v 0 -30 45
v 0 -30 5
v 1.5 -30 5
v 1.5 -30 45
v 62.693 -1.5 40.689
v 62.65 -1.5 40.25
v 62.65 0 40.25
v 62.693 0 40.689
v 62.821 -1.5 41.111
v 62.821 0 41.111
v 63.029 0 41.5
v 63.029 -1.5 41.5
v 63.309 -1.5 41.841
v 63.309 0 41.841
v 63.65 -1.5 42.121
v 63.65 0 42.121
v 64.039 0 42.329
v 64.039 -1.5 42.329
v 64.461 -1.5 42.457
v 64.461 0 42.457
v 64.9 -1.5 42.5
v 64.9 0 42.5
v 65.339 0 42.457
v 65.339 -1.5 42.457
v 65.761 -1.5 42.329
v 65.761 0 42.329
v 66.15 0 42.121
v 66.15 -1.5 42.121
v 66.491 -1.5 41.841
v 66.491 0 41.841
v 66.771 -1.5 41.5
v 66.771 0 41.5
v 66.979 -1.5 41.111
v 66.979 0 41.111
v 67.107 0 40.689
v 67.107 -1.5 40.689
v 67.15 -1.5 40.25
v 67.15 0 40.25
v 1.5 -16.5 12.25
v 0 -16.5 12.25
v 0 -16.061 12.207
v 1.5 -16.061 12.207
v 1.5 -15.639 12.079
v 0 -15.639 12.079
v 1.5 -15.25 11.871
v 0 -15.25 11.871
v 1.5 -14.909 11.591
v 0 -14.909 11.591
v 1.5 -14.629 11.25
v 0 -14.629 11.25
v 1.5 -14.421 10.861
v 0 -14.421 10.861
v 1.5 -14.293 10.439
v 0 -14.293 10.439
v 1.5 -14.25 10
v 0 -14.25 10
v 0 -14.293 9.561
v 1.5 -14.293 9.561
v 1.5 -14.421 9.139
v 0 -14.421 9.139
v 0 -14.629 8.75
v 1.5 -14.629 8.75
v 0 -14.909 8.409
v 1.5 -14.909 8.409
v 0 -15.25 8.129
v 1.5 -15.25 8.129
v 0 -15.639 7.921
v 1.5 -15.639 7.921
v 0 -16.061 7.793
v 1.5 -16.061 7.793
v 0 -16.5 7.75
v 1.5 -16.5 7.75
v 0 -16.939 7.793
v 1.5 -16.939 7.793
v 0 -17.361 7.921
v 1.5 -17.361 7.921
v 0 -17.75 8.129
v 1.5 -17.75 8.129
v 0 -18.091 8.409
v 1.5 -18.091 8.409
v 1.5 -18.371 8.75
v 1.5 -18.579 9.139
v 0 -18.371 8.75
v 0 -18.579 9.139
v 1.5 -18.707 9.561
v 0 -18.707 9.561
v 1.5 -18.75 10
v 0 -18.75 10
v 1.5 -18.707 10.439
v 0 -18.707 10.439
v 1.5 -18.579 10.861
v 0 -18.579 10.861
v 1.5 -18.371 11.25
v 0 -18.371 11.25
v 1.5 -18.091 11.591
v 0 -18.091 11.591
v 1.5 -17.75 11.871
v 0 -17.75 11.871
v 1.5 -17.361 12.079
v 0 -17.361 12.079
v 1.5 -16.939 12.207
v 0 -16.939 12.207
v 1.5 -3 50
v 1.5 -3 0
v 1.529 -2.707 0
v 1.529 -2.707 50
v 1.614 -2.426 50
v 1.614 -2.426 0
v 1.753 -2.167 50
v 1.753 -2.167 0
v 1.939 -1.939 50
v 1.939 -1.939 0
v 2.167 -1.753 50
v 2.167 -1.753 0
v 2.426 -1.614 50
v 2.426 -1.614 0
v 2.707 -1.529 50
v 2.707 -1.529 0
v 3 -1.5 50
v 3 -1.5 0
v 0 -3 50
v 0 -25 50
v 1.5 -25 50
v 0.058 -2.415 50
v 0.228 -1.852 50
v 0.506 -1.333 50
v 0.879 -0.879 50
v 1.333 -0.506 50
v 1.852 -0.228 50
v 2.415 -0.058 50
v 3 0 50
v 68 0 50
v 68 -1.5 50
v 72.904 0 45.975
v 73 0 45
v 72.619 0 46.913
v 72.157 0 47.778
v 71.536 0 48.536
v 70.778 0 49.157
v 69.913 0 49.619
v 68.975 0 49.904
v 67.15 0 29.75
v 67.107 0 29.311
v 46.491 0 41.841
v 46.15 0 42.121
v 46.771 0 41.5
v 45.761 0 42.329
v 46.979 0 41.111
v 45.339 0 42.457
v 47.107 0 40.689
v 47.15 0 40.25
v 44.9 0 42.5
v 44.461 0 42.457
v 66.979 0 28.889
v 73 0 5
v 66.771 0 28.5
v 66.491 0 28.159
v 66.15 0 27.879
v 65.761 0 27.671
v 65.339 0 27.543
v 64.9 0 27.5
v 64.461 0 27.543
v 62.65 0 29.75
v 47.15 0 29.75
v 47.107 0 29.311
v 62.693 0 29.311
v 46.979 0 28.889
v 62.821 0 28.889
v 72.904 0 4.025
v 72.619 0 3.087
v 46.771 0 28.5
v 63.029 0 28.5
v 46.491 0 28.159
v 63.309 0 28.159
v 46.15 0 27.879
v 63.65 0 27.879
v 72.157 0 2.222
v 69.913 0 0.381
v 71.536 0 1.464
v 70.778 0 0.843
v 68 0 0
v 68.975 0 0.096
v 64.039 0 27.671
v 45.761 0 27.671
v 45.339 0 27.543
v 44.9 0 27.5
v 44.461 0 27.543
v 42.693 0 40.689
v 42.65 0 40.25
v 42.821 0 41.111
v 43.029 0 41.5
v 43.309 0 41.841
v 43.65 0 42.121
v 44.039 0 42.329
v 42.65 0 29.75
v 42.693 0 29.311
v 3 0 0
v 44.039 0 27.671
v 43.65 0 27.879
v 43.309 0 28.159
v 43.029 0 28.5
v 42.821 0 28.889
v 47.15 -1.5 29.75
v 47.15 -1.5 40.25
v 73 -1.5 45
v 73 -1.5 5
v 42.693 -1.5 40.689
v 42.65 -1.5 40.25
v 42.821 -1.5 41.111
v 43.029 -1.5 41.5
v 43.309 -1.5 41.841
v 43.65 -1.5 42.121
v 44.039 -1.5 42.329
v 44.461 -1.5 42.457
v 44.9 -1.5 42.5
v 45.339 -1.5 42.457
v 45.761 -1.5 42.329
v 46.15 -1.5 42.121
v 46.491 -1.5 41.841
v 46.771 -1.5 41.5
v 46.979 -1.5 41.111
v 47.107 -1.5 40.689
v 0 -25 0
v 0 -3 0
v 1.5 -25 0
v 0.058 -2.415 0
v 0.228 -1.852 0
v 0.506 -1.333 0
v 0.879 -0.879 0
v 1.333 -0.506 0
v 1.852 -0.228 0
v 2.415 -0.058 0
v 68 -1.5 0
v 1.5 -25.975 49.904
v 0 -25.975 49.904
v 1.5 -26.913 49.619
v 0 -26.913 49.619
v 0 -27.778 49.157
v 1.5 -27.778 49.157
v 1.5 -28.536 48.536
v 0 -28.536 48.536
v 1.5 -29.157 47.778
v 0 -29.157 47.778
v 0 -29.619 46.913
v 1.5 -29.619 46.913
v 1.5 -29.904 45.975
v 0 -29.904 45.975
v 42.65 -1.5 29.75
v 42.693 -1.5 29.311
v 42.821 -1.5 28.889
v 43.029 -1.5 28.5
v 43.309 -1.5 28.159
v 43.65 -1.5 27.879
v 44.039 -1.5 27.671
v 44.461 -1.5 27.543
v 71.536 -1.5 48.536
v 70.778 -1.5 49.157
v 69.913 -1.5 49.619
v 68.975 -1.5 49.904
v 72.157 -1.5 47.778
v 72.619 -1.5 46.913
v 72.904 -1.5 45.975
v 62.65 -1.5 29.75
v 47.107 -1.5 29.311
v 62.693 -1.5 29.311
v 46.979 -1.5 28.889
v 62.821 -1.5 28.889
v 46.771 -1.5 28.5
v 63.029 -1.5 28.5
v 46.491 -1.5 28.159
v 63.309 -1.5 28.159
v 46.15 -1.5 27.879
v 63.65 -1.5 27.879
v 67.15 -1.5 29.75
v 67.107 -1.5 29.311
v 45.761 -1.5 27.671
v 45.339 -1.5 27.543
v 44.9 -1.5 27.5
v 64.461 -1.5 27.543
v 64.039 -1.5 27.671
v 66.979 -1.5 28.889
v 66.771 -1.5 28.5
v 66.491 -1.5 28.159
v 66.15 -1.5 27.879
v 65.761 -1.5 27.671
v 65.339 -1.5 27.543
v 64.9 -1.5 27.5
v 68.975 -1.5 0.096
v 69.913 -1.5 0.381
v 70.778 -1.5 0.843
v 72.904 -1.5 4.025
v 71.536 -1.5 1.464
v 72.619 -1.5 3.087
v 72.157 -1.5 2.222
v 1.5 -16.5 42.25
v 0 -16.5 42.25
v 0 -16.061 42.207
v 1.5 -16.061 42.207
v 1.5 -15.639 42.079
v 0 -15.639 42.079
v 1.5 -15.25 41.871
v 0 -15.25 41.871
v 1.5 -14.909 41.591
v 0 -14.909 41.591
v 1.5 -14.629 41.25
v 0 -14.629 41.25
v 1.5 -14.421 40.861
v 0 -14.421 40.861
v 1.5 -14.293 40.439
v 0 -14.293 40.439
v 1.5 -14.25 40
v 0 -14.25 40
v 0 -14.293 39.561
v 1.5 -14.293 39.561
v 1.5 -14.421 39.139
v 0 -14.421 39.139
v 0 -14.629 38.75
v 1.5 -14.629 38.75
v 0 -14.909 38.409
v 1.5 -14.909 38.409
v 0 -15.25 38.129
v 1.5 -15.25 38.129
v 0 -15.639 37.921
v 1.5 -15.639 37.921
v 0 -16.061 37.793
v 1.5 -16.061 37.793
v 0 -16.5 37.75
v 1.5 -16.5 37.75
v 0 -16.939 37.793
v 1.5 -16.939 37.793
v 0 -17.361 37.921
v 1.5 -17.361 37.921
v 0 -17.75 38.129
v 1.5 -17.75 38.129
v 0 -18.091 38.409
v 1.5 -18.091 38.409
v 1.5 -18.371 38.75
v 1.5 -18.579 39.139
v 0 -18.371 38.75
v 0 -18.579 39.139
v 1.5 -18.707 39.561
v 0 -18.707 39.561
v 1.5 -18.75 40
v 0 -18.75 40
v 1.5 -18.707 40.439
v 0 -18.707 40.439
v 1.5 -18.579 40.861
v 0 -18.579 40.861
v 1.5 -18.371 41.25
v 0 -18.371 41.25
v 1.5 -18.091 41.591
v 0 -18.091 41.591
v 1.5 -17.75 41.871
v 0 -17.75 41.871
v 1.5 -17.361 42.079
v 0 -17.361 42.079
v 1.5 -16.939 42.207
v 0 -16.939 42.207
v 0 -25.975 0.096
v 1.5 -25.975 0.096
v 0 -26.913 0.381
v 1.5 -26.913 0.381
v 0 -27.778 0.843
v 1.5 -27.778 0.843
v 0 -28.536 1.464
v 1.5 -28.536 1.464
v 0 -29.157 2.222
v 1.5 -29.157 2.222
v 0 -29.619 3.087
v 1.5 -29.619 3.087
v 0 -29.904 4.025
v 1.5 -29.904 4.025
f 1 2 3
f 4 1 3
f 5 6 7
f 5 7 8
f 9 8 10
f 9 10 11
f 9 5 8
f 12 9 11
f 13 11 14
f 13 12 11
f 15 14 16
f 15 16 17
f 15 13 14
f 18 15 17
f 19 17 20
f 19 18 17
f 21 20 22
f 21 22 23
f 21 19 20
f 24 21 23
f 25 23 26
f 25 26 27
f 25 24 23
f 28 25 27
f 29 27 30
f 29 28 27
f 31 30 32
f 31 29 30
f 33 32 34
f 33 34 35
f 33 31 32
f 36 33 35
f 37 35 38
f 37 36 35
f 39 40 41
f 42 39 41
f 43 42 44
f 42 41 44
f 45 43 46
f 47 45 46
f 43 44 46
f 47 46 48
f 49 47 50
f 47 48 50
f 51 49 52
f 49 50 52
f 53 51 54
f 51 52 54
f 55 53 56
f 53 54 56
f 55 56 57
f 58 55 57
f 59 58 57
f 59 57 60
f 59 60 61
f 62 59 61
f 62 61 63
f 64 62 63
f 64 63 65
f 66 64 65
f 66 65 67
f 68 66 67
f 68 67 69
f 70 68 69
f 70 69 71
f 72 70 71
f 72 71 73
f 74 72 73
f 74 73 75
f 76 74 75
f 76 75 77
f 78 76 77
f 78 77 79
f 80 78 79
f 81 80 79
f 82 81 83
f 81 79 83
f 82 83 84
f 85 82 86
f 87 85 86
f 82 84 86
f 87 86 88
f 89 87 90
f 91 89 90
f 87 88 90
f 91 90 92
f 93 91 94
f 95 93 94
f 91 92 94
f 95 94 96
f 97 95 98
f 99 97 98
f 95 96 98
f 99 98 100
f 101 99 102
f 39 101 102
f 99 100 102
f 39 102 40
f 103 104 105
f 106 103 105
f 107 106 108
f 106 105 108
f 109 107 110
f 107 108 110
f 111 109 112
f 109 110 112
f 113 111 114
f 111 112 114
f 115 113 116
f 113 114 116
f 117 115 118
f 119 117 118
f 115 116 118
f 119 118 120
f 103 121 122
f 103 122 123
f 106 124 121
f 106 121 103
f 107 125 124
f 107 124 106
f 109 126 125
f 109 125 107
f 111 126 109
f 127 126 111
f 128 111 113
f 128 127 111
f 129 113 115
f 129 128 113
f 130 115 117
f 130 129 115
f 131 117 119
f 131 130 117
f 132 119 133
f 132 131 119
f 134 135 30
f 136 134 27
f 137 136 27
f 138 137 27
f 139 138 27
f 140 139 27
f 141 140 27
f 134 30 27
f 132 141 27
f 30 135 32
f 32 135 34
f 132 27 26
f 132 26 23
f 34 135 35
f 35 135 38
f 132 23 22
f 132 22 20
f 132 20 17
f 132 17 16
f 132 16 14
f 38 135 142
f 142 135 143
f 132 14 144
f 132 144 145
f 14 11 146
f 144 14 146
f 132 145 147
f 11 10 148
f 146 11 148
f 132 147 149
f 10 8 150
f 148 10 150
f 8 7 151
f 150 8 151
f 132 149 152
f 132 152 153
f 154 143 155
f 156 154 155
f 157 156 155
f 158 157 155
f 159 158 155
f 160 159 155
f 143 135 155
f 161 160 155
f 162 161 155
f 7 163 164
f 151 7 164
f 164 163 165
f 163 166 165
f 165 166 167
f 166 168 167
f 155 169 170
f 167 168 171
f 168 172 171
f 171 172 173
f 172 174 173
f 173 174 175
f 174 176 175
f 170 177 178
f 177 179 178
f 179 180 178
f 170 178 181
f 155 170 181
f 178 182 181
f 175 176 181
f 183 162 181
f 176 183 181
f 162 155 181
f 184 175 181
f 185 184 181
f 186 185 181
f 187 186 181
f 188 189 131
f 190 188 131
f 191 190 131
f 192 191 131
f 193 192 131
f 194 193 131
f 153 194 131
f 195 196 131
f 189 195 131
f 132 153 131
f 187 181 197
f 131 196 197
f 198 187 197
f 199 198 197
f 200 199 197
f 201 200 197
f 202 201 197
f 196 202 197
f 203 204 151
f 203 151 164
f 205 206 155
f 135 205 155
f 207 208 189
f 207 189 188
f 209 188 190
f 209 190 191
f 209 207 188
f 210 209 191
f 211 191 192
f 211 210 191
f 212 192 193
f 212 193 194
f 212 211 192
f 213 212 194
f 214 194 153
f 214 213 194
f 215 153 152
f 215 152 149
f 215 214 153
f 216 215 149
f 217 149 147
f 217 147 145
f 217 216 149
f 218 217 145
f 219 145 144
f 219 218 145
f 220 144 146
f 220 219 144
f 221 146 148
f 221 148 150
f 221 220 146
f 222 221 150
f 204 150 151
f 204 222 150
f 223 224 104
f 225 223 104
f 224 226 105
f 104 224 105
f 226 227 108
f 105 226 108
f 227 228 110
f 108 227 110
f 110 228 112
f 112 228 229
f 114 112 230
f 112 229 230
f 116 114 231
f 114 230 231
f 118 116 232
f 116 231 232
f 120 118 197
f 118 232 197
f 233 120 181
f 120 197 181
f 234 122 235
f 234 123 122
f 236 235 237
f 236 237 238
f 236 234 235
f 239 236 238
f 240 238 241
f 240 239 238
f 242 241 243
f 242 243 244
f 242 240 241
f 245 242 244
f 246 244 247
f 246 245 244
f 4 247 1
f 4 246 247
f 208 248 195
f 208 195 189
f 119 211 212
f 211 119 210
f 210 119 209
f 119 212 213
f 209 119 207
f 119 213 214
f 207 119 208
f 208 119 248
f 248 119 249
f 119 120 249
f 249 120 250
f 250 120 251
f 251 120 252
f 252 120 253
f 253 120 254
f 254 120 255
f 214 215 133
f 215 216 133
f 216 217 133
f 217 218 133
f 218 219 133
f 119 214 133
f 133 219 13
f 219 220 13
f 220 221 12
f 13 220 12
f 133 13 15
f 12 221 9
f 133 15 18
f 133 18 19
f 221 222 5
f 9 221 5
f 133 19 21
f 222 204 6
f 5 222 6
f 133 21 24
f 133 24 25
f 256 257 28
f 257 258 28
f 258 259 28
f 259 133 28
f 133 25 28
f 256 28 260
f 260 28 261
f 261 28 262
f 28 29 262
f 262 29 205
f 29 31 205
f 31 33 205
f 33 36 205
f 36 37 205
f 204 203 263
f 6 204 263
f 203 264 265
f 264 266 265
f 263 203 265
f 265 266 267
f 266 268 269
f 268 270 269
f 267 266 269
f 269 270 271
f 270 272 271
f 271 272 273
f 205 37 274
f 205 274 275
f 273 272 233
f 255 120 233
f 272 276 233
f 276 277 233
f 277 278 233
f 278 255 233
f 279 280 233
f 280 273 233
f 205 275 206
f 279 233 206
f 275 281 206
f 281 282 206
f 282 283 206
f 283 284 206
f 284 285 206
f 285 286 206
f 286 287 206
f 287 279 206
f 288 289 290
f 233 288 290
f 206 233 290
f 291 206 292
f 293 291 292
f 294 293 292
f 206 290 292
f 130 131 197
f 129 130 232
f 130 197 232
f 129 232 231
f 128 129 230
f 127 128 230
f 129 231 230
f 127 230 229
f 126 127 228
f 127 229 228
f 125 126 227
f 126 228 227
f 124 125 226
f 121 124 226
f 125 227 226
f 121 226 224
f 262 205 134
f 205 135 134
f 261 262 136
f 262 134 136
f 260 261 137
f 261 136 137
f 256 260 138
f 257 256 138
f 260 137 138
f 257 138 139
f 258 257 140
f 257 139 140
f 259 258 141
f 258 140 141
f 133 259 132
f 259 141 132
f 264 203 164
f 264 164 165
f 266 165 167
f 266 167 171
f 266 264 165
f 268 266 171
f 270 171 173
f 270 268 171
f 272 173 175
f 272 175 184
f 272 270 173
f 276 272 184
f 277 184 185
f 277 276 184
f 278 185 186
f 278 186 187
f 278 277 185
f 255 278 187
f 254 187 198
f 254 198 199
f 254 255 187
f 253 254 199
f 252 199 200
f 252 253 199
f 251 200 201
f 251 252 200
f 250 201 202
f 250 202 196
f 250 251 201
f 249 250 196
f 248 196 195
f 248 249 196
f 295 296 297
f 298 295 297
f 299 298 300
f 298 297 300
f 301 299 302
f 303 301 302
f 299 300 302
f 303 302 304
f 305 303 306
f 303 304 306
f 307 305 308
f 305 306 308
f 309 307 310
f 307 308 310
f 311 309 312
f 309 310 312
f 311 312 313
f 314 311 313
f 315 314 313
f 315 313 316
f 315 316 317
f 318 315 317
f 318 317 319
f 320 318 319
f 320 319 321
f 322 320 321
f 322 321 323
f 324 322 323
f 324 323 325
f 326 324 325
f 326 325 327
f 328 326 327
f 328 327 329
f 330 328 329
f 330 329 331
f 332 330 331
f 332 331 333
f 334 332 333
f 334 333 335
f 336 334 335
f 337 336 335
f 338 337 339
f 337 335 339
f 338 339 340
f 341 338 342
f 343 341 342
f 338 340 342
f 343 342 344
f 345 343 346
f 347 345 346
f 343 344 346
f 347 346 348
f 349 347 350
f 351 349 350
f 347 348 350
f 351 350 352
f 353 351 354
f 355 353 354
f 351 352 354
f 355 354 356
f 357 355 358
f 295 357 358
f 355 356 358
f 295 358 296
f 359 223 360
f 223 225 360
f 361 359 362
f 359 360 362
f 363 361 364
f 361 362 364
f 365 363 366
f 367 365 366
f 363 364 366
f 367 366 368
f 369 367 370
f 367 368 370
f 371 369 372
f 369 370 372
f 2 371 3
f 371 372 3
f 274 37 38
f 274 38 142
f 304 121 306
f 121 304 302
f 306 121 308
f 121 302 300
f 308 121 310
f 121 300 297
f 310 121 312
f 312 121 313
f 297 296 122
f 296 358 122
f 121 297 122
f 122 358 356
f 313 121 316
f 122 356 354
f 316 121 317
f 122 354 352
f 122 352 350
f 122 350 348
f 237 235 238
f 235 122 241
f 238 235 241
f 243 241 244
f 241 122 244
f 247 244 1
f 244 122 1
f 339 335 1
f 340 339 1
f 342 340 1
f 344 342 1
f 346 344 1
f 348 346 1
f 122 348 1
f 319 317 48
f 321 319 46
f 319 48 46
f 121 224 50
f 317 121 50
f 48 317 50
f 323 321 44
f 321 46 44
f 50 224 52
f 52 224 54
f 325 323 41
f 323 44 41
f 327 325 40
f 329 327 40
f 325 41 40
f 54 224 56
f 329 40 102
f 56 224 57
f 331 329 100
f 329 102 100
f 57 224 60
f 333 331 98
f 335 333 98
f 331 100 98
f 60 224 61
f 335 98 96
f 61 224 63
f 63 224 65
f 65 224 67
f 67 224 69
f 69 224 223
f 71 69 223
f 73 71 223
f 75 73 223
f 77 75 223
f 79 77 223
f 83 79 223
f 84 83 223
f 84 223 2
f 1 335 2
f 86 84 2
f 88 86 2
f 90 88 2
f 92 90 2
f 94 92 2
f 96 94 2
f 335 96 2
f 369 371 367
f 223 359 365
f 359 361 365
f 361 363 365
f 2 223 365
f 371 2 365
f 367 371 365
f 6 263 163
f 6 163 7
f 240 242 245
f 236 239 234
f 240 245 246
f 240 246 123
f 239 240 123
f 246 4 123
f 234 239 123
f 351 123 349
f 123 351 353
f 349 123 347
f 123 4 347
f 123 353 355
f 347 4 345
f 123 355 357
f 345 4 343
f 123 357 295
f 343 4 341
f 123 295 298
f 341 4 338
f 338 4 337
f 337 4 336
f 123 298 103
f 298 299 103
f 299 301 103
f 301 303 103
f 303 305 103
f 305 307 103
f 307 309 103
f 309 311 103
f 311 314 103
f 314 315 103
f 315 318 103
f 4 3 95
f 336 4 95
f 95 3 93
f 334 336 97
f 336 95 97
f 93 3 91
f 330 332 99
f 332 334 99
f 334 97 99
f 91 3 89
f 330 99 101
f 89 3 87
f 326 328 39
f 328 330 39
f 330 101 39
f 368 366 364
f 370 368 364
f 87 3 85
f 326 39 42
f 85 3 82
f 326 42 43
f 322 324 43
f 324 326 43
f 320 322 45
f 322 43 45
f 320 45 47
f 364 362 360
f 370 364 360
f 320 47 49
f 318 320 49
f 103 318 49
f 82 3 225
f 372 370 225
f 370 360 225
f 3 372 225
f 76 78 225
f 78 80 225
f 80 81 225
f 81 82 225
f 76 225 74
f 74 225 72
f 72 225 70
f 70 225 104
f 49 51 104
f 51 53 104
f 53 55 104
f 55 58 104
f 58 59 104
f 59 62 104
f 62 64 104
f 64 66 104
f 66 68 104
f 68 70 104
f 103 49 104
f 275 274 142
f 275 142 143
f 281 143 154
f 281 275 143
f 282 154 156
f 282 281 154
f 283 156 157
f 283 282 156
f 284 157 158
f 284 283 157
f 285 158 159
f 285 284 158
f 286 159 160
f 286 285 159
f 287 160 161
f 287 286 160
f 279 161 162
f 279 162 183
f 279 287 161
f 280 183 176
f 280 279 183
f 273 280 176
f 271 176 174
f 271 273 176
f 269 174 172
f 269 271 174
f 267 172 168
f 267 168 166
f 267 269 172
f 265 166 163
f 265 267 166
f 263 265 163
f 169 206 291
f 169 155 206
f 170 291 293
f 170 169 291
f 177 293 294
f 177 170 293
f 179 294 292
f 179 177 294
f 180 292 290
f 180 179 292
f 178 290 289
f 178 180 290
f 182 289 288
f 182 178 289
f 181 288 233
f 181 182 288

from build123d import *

# Parameters (mm, degrees)
BASE_FLANGE1_DEPTH       = 50
M4_START                 = -1.5
M4_CLEARANCE_SLOT1_DEPTH = 1.5
M4_CLEARANCE_HOLE1_D     = 4.5
FILLET1_R                = 5


# Read off the part's stored shape, not the designer's step: M4 Clearance Slot1
# Sheet-metal steps are written as plain solids
with BuildPart() as part:
    # Sketch1 → Base-Flange1 (new body)
    with BuildSketch(Plane.XY):
        with BuildLine():
            Line((73, 0), (3, 0))
            ThreePointArc((3, 0), (0.878679656, -0.878679656), (0, -3))
            Line((0, -3), (0, -30))
            Line((0, -30), (1.5, -30))
            Line((1.5, -30), (1.5, -3))
            ThreePointArc((1.5, -3), (1.939339828, -1.939339828), (3, -1.5))
            Line((3, -1.5), (73, -1.5))
            Line((73, -1.5), (73, 0))
        make_face()
    extrude(amount=BASE_FLANGE1_DEPTH)

    # M4 Clearance Slot1 outline → M4 Clearance Slot1 (cut)
    with BuildSketch(Plane(origin=(0, 0, 0), x_dir=(1, 0, 0), z_dir=(0, 1, 0)).offset(M4_START)):
        with BuildLine():
            Line((47.15, -40.25), (47.15, -29.75))
            ThreePointArc((47.15, -29.75), (44.9, -27.5), (42.65, -29.75))
            Line((42.65, -29.75), (42.65, -40.25))
            ThreePointArc((42.65, -40.25), (44.9, -42.5), (47.15, -40.25))
        make_face()
        with BuildLine():
            Line((67.15, -40.25), (67.15, -29.75))
            ThreePointArc((67.15, -29.75), (64.9, -27.5), (62.65, -29.75))
            Line((62.65, -29.75), (62.65, -40.25))
            ThreePointArc((62.65, -40.25), (64.9, -42.5), (67.15, -40.25))
        make_face()
    extrude(amount=M4_CLEARANCE_SLOT1_DEPTH, mode=Mode.SUBTRACT)

    # M4 Clearance Hole1 (through all)
    with Locations(Plane(origin=(1.5, 0, 0), x_dir=(0, 0, -1), z_dir=(1, 0, 0))):
        with Locations((-40, -16.5), (-10, -16.5)):
            Hole(M4_CLEARANCE_HOLE1_D / 2)

    # Fillet1
    fillet1_edges = [part.edges().sort_by_distance(p)[0] for p in [
        (73, -0.75, 50),
        (73, -0.75, 0),
        (0.75, -30, 50),
        (0.75, -30, 0),
    ]]
    fillet(fillet1_edges, radius=FILLET1_R)


solid = part.part
